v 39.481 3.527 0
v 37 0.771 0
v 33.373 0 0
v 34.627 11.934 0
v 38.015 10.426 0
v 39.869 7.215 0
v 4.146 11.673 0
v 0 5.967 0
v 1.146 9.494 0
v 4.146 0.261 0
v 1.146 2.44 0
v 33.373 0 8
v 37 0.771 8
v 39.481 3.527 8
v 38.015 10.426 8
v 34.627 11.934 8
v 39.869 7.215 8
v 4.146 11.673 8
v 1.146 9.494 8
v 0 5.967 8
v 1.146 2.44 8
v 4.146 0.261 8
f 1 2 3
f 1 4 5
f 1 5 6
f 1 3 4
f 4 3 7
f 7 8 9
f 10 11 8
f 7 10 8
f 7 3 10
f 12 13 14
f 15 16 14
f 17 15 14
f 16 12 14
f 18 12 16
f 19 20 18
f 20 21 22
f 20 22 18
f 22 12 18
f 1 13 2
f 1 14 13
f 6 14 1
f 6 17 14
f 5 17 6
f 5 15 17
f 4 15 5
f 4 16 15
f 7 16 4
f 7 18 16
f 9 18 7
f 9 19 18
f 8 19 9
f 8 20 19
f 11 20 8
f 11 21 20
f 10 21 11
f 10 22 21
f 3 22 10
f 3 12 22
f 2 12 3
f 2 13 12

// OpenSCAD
$fn = 32;

// ----------------------------------------------------------------------
// Key bar: parallel key, 8 mm thick
// ----------------------------------------------------------------------

// --- parameters (mm) ---
profile_height = 8;       // extrusion height
profile_points = 11;      // points of the closed outline

profile = [[0, 5.967], [1.146, 2.44], [4.146, 0.261], [33.373, 0], [37, 0.771], [39.481, 3.527], [39.869, 7.215], [38.015, 10.426], [34.627, 11.934], [4.146, 11.673], [1.146, 9.494]];  // single closed polygon, 11 points, counter clockwise

// --- the one profile operation ---
linear_extrude(height = profile_height) polygon(points = profile);
